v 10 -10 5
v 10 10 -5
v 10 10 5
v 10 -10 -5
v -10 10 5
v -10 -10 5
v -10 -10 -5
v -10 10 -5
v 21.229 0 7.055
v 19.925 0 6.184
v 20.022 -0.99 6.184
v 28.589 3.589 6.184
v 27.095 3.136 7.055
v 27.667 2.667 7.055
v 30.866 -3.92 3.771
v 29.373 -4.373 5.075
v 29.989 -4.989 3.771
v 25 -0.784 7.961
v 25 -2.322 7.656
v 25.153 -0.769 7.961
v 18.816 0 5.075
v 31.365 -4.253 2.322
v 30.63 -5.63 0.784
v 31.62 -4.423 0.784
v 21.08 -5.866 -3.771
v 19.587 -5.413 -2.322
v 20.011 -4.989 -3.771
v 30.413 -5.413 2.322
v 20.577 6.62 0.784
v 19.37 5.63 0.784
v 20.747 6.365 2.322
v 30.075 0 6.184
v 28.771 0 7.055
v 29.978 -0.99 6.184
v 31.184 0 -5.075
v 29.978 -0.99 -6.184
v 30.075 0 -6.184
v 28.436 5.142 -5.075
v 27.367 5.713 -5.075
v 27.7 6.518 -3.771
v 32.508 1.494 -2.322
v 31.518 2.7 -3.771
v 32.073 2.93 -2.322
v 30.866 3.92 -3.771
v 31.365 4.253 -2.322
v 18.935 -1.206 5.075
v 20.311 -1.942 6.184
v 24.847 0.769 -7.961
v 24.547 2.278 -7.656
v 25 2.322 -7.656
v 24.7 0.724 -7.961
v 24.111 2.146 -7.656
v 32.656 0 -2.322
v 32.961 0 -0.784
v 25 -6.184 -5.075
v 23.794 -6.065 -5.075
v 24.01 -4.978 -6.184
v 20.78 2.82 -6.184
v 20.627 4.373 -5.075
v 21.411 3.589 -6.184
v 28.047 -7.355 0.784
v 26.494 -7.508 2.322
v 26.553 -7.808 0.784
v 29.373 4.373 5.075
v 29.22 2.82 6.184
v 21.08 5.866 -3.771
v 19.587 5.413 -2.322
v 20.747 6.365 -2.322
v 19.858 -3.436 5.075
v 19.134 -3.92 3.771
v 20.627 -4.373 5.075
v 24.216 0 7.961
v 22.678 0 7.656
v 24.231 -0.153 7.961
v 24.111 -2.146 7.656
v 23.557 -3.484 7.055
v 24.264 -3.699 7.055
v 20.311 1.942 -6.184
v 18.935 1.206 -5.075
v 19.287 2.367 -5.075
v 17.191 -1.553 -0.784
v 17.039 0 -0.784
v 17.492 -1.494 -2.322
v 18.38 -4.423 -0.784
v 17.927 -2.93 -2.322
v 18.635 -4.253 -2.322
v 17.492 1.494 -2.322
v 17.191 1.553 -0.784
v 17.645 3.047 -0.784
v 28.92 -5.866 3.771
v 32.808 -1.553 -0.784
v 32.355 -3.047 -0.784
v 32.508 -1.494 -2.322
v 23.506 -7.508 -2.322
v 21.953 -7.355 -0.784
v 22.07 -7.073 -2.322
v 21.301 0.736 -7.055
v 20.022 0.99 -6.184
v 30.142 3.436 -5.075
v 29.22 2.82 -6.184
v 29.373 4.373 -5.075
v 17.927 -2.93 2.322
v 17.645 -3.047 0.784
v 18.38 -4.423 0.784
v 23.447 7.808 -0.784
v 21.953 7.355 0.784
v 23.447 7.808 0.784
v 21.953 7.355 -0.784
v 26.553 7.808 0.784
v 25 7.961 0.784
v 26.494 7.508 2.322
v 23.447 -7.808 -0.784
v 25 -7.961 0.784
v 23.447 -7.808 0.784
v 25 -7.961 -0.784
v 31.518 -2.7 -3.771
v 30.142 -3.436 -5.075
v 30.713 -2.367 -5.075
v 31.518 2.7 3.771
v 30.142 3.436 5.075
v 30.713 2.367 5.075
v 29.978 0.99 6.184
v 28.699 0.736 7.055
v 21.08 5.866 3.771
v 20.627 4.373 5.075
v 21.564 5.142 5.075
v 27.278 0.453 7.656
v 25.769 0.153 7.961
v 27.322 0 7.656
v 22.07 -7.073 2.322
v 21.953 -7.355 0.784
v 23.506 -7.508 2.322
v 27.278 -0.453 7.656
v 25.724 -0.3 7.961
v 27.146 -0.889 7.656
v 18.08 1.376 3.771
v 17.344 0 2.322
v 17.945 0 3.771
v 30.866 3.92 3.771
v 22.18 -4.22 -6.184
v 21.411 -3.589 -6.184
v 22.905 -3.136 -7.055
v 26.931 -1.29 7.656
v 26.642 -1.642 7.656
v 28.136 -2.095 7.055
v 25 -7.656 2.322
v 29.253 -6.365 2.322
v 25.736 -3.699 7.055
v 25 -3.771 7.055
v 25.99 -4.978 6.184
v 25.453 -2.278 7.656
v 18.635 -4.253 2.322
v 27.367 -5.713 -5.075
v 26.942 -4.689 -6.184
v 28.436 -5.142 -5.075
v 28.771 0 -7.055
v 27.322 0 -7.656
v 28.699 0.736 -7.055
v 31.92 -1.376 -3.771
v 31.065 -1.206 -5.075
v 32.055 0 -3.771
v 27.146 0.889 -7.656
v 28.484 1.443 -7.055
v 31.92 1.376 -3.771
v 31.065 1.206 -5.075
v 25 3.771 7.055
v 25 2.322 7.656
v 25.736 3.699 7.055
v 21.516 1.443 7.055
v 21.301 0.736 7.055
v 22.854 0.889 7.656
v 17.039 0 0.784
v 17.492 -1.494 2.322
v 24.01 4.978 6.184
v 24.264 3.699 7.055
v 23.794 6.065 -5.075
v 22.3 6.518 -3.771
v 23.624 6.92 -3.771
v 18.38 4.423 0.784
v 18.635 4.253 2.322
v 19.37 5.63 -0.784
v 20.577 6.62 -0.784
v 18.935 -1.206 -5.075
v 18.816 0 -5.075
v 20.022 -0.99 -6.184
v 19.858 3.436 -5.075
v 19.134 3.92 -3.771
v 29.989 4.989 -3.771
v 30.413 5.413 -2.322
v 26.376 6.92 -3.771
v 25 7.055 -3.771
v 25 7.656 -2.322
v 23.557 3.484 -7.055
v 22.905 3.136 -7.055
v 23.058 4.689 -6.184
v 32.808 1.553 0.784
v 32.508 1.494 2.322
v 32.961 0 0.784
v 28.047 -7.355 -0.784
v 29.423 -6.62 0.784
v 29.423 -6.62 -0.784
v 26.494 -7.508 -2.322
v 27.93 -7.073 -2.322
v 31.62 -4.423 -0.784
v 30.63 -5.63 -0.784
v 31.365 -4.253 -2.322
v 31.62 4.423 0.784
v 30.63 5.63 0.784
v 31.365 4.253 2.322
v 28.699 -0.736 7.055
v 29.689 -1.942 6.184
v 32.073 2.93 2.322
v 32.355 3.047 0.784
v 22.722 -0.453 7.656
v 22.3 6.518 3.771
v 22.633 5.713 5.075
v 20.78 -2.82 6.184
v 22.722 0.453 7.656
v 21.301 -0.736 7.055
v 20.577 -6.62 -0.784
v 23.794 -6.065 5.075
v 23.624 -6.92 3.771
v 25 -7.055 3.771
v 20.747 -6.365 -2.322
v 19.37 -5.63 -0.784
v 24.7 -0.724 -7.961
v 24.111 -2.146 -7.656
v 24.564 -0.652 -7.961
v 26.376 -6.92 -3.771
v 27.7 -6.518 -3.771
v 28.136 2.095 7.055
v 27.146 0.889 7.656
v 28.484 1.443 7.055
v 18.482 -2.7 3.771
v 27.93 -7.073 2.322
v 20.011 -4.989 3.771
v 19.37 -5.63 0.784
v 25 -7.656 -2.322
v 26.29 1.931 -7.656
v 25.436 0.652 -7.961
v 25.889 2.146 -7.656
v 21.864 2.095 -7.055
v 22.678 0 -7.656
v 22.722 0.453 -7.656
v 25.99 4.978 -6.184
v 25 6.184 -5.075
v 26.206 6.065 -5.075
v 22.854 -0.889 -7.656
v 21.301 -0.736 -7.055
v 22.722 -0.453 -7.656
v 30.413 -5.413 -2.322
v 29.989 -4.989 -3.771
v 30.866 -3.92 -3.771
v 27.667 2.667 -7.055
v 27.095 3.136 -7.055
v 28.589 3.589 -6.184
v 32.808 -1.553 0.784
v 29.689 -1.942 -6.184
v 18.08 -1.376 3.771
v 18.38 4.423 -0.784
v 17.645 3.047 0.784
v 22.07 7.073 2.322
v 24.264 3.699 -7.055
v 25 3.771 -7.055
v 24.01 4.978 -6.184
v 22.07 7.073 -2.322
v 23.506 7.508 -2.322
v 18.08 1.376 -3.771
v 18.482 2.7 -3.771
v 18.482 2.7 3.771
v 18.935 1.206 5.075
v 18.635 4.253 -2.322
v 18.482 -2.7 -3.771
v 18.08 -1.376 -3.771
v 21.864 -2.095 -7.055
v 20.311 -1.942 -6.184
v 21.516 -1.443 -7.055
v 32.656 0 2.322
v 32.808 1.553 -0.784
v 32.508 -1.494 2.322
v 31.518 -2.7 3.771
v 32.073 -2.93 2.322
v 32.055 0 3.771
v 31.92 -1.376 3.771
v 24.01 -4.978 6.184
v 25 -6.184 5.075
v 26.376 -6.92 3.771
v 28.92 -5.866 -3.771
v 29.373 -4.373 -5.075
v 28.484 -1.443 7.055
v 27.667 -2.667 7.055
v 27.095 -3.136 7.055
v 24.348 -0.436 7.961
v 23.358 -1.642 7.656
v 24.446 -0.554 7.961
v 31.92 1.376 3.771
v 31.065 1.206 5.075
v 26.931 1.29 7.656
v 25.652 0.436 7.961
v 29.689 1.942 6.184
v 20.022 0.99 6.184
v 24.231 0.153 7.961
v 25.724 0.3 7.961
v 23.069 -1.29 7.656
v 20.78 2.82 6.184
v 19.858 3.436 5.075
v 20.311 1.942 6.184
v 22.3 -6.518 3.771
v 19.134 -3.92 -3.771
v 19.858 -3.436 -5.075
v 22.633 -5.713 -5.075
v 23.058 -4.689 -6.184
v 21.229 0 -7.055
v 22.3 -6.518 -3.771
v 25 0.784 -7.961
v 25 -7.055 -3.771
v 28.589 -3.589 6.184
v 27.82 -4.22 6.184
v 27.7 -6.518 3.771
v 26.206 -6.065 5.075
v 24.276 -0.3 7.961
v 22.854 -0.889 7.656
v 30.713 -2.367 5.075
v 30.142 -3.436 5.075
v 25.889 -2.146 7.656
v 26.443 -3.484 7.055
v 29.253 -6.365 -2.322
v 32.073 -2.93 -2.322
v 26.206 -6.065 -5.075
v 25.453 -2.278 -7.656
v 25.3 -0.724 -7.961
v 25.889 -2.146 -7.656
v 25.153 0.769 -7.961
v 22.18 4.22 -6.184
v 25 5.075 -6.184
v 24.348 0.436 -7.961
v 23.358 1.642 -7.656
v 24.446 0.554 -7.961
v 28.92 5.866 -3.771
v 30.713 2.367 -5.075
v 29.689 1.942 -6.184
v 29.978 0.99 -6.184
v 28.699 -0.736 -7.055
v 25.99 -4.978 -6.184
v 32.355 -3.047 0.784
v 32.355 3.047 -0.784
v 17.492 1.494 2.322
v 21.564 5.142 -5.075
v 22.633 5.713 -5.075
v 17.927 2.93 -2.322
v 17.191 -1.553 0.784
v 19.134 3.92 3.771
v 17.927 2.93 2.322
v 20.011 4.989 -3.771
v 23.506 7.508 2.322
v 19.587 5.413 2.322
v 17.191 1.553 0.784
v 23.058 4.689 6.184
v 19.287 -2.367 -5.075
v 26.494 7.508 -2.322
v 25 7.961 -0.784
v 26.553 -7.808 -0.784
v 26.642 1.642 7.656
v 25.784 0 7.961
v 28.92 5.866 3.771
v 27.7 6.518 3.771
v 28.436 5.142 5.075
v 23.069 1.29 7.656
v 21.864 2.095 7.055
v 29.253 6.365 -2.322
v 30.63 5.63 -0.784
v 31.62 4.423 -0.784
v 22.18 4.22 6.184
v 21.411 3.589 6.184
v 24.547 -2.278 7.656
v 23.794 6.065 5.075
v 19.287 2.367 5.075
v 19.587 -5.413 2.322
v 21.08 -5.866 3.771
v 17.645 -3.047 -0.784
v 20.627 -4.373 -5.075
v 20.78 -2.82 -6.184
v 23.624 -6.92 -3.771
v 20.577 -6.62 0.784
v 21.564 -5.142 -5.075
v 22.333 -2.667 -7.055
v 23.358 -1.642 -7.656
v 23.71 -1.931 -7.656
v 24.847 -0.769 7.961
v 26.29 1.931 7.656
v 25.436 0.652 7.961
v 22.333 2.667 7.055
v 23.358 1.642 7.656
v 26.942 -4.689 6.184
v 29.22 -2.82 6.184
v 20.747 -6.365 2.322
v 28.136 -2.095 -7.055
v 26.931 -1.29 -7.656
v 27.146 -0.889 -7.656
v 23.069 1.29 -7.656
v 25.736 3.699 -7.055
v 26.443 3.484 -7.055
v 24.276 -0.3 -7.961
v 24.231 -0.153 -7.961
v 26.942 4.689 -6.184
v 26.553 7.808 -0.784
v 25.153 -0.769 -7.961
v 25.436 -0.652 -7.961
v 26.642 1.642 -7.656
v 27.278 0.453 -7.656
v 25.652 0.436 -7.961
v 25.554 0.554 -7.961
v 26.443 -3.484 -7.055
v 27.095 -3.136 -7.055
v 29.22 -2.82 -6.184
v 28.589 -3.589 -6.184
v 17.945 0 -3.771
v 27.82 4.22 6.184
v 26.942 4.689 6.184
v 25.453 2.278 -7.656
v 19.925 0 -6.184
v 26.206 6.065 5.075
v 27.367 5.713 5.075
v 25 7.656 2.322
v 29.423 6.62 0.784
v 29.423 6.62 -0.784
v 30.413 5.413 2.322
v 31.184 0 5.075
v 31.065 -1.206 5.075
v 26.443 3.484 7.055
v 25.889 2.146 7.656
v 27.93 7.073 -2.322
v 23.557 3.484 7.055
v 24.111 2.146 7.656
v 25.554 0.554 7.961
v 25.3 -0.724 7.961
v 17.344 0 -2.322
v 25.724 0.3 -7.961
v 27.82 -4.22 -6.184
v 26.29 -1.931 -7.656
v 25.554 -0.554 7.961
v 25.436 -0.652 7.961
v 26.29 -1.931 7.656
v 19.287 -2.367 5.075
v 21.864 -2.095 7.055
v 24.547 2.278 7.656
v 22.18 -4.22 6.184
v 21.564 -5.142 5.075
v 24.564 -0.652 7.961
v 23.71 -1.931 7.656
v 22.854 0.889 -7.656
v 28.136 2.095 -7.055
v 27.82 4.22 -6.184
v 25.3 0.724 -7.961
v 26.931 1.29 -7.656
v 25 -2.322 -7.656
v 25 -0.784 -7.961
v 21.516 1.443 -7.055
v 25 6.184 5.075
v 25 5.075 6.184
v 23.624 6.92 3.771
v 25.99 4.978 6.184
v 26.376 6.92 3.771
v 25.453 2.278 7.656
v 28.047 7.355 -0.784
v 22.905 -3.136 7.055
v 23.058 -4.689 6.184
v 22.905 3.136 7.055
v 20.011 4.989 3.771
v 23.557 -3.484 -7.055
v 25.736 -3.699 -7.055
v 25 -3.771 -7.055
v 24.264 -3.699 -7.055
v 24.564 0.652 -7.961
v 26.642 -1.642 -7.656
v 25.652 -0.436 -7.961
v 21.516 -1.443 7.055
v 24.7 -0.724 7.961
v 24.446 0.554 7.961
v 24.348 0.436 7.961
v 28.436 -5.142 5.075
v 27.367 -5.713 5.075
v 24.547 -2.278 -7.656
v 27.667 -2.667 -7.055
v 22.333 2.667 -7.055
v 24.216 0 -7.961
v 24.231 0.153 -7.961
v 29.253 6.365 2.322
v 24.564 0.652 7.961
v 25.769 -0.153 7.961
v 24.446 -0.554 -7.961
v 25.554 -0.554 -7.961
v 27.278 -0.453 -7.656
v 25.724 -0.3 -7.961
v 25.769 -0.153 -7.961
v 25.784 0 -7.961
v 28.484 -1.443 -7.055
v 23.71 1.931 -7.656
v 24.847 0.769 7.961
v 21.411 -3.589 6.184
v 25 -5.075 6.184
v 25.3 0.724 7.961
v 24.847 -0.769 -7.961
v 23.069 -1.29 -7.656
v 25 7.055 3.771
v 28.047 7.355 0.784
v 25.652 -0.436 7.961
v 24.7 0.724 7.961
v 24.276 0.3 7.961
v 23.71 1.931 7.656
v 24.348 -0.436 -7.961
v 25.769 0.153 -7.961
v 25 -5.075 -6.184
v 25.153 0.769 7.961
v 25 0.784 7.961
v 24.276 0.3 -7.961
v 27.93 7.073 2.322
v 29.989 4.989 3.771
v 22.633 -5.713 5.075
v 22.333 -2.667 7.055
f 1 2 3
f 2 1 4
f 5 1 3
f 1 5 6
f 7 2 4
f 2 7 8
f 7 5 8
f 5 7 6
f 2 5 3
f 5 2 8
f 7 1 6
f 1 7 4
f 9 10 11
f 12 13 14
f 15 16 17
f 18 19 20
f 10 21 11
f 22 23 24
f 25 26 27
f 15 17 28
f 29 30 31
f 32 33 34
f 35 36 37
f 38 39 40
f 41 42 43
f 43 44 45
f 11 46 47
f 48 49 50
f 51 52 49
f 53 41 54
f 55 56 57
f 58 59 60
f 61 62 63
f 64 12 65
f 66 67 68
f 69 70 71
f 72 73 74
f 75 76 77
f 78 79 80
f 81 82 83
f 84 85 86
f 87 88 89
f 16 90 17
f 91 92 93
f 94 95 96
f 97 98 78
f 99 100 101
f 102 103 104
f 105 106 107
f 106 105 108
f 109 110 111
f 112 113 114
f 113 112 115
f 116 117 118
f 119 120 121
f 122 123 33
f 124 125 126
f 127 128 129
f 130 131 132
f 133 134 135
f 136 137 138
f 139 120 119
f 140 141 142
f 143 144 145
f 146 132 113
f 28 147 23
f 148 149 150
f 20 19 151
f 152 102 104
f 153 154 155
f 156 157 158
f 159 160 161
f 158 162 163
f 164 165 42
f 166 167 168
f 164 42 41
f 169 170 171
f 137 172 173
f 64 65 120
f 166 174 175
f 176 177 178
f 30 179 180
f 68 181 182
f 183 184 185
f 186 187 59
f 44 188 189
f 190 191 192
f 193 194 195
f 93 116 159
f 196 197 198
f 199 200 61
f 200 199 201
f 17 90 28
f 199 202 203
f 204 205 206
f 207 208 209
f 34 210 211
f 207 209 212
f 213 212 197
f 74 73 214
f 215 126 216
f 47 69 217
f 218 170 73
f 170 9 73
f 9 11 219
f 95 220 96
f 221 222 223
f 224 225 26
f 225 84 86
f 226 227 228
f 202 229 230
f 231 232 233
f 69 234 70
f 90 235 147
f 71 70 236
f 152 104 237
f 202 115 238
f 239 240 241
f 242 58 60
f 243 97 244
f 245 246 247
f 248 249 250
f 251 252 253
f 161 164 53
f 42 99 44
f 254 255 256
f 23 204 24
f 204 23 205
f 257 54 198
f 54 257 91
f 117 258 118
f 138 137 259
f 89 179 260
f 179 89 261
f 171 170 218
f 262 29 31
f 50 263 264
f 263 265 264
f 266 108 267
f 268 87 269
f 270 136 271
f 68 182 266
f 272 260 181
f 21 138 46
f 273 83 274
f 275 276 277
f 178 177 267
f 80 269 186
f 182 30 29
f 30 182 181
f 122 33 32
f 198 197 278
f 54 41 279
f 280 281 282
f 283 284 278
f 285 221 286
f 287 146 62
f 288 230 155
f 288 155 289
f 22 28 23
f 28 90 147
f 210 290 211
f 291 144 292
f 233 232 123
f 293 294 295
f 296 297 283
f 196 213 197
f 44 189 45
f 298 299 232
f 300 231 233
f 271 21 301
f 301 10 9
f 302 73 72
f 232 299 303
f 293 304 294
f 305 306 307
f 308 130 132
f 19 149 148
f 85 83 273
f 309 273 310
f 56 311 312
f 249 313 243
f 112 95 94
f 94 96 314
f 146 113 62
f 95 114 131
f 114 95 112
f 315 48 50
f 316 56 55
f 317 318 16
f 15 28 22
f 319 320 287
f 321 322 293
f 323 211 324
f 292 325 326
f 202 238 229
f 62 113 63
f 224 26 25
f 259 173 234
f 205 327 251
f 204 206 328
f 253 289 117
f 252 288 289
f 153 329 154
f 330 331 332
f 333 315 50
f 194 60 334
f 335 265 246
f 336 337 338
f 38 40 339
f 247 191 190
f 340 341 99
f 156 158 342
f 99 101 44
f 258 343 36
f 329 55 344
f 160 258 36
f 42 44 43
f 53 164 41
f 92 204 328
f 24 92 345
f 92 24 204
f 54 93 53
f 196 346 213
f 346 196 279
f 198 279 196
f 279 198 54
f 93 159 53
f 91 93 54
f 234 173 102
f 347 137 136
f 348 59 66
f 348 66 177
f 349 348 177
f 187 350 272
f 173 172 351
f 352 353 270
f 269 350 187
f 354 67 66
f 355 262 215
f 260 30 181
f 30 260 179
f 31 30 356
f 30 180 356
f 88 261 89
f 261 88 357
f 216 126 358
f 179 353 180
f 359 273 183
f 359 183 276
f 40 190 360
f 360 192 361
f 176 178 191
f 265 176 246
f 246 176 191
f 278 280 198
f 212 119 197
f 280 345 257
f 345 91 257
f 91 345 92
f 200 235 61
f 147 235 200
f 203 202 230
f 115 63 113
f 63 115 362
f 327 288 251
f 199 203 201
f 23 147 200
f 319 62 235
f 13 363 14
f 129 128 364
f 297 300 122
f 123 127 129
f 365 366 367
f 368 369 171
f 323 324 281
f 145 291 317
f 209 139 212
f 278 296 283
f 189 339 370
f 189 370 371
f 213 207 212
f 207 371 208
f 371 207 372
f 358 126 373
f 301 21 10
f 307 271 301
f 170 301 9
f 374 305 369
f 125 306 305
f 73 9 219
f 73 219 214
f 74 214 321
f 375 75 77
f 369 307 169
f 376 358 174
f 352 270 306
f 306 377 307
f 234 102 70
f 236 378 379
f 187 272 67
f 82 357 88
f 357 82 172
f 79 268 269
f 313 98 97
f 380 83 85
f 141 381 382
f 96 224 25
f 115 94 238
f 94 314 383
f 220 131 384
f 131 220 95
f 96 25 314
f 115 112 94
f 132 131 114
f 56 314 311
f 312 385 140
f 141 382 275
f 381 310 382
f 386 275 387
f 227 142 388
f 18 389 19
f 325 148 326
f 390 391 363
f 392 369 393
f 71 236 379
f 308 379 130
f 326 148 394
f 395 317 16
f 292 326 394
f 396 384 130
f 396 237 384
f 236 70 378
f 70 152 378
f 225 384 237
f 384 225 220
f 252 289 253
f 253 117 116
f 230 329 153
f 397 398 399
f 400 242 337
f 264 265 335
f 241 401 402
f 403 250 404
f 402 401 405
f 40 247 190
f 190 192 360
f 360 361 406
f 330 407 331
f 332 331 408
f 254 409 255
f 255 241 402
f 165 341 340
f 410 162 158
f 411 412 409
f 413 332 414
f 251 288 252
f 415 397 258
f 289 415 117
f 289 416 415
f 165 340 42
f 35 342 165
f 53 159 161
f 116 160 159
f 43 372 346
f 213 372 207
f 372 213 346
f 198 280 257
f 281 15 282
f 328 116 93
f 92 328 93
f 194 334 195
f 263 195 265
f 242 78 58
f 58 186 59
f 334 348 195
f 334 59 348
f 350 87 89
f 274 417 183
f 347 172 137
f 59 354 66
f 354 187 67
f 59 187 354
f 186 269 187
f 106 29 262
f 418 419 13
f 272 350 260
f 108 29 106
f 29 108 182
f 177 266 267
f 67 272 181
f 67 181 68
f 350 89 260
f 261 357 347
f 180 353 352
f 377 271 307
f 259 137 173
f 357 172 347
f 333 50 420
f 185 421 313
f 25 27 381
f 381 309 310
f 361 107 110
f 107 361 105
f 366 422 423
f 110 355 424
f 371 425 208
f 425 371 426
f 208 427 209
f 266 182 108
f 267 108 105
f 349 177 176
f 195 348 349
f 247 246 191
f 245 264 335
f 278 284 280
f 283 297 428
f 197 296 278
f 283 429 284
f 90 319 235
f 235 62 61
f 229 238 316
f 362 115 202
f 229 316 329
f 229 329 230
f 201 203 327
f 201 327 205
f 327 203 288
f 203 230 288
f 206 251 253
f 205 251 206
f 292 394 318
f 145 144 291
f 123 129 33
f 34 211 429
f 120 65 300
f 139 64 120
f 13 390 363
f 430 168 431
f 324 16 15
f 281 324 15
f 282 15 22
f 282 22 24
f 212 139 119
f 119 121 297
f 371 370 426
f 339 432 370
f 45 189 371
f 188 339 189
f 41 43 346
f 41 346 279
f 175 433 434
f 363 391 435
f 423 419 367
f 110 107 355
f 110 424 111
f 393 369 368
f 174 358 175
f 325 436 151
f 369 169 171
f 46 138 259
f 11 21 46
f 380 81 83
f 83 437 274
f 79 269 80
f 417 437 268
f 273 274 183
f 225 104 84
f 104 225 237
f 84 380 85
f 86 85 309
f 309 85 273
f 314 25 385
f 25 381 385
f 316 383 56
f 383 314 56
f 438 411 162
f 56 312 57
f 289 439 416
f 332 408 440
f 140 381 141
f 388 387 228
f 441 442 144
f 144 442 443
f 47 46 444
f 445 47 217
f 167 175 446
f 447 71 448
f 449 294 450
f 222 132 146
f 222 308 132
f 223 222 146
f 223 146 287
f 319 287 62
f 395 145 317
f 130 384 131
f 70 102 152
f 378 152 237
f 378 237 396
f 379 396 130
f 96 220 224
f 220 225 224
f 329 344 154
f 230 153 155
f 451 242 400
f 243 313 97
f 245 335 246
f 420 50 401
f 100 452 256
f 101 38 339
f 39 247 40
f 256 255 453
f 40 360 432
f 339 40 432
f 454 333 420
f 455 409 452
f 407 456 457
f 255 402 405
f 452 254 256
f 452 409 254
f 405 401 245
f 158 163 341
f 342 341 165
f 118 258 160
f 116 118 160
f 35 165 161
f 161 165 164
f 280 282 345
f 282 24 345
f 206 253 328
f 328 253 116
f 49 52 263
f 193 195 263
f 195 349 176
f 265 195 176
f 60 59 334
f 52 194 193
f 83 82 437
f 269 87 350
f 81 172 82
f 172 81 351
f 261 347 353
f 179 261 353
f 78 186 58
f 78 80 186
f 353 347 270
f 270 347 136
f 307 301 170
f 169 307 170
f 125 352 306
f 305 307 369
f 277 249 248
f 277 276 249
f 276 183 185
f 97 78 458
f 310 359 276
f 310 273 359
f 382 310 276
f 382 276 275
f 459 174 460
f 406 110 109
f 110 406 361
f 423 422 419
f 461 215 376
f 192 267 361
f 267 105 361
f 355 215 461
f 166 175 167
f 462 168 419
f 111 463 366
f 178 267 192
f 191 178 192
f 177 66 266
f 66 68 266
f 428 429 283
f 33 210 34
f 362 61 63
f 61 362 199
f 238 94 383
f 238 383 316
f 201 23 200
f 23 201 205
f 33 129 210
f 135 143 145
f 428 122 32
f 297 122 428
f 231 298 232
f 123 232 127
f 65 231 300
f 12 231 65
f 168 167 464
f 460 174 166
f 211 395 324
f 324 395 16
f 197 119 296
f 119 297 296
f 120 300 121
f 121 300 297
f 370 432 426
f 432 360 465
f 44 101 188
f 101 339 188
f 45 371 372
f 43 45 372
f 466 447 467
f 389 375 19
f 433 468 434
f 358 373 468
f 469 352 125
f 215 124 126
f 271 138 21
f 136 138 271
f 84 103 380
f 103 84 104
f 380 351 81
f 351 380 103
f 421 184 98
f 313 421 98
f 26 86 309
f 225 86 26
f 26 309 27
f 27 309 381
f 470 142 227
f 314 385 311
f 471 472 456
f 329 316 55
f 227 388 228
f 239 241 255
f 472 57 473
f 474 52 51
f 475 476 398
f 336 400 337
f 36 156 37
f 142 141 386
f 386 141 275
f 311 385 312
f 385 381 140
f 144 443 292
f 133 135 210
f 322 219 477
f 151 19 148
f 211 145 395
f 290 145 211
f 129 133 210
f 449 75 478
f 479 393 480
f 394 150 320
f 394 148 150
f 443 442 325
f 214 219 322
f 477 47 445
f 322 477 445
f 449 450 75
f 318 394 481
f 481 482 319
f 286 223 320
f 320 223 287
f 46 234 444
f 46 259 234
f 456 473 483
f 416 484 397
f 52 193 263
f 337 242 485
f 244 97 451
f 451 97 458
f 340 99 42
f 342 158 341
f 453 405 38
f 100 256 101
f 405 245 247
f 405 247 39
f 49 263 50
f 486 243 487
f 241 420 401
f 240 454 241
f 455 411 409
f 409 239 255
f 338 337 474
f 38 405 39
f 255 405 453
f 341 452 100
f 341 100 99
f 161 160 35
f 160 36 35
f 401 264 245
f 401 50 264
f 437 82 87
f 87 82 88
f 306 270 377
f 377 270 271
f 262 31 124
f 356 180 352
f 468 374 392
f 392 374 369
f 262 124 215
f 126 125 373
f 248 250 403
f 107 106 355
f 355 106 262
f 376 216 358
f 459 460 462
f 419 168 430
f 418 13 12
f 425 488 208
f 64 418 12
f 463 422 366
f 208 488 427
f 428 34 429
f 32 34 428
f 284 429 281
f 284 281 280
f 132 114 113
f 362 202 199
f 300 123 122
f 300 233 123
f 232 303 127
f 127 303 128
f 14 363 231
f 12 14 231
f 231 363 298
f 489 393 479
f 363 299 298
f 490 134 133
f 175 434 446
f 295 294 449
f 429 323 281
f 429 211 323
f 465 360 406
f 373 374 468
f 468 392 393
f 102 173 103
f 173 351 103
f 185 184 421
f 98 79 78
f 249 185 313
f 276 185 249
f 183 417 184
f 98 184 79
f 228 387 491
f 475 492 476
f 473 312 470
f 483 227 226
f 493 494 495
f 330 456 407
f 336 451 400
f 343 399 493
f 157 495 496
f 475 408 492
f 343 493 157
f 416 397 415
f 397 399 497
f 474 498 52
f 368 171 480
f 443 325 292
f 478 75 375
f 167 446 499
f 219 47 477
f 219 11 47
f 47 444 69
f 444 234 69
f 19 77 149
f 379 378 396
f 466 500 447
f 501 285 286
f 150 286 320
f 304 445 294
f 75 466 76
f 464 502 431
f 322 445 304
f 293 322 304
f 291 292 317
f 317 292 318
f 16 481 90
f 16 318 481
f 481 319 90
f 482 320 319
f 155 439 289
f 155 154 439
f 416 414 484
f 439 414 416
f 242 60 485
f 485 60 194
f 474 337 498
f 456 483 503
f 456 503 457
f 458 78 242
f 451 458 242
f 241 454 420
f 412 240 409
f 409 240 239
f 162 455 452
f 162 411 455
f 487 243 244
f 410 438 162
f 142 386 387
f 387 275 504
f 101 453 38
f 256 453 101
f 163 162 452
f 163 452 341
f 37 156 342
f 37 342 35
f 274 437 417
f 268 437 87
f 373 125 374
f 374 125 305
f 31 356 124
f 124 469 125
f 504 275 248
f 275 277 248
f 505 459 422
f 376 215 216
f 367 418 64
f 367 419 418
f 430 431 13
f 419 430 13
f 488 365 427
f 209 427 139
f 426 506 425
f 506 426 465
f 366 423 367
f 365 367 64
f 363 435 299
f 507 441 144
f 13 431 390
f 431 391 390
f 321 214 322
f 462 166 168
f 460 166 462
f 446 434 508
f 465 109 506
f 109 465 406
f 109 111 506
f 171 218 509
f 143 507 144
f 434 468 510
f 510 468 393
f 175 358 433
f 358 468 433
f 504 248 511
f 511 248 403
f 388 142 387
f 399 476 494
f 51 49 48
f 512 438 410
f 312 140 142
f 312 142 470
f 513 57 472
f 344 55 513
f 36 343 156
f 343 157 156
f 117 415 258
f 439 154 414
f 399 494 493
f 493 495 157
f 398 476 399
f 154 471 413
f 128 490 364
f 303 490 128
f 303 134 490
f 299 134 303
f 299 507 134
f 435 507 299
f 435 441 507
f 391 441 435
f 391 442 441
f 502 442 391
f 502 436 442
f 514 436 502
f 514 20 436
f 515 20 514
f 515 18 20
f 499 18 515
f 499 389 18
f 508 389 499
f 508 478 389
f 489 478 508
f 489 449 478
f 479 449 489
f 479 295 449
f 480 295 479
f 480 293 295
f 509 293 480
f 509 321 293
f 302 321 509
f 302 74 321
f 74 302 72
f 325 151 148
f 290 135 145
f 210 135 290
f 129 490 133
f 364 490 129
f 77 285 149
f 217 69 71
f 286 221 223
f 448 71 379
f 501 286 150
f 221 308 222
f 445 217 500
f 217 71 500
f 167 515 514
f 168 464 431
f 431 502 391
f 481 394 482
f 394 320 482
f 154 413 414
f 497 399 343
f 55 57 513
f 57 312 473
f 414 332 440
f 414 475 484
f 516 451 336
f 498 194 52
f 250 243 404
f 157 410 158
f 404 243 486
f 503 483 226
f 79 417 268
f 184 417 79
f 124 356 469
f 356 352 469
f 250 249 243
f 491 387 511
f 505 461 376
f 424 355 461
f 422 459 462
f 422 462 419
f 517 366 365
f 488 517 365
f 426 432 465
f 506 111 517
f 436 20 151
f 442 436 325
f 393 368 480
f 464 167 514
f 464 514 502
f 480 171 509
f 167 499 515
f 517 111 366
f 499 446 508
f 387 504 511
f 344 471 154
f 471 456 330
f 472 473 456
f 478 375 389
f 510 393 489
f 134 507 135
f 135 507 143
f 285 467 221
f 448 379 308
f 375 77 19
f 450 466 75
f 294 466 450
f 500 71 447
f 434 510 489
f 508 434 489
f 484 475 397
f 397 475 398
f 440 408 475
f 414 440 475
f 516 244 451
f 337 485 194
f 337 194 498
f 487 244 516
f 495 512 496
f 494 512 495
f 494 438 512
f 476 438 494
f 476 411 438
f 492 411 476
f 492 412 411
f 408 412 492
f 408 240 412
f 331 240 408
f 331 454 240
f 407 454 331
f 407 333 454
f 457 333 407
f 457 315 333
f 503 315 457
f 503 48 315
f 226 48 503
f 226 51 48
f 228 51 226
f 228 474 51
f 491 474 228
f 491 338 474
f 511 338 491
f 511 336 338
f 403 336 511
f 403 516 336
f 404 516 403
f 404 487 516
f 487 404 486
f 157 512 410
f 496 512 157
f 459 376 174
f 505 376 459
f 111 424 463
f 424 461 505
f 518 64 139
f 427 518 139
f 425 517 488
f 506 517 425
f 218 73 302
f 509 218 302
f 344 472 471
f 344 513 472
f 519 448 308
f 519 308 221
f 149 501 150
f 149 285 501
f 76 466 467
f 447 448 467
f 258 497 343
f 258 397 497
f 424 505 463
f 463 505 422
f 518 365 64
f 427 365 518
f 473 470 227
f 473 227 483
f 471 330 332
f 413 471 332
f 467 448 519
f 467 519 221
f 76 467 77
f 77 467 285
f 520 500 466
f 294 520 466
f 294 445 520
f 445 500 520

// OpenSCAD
// The four debug modifiers, and what each one does to the result.
// In BetterSCAD these are "roles" rather than special cases; see docs/architecture.md.

$fn = 32;

// Normal geometry.
cube([20, 20, 10], center = true);

// '#' highlights a subtree while it still contributes geometry.
#translate([25, 0, 0]) sphere(8);

// '%' draws a transparent reference that is NOT part of the result.
%translate([-25, 0, 0]) sphere(8);

// '*' disables a subtree entirely.
*translate([0, 25, 0]) sphere(8);

// '!' would render ONLY its subtree, discarding everything else. Uncomment:
// !translate([0, -25, 0]) sphere(8);
